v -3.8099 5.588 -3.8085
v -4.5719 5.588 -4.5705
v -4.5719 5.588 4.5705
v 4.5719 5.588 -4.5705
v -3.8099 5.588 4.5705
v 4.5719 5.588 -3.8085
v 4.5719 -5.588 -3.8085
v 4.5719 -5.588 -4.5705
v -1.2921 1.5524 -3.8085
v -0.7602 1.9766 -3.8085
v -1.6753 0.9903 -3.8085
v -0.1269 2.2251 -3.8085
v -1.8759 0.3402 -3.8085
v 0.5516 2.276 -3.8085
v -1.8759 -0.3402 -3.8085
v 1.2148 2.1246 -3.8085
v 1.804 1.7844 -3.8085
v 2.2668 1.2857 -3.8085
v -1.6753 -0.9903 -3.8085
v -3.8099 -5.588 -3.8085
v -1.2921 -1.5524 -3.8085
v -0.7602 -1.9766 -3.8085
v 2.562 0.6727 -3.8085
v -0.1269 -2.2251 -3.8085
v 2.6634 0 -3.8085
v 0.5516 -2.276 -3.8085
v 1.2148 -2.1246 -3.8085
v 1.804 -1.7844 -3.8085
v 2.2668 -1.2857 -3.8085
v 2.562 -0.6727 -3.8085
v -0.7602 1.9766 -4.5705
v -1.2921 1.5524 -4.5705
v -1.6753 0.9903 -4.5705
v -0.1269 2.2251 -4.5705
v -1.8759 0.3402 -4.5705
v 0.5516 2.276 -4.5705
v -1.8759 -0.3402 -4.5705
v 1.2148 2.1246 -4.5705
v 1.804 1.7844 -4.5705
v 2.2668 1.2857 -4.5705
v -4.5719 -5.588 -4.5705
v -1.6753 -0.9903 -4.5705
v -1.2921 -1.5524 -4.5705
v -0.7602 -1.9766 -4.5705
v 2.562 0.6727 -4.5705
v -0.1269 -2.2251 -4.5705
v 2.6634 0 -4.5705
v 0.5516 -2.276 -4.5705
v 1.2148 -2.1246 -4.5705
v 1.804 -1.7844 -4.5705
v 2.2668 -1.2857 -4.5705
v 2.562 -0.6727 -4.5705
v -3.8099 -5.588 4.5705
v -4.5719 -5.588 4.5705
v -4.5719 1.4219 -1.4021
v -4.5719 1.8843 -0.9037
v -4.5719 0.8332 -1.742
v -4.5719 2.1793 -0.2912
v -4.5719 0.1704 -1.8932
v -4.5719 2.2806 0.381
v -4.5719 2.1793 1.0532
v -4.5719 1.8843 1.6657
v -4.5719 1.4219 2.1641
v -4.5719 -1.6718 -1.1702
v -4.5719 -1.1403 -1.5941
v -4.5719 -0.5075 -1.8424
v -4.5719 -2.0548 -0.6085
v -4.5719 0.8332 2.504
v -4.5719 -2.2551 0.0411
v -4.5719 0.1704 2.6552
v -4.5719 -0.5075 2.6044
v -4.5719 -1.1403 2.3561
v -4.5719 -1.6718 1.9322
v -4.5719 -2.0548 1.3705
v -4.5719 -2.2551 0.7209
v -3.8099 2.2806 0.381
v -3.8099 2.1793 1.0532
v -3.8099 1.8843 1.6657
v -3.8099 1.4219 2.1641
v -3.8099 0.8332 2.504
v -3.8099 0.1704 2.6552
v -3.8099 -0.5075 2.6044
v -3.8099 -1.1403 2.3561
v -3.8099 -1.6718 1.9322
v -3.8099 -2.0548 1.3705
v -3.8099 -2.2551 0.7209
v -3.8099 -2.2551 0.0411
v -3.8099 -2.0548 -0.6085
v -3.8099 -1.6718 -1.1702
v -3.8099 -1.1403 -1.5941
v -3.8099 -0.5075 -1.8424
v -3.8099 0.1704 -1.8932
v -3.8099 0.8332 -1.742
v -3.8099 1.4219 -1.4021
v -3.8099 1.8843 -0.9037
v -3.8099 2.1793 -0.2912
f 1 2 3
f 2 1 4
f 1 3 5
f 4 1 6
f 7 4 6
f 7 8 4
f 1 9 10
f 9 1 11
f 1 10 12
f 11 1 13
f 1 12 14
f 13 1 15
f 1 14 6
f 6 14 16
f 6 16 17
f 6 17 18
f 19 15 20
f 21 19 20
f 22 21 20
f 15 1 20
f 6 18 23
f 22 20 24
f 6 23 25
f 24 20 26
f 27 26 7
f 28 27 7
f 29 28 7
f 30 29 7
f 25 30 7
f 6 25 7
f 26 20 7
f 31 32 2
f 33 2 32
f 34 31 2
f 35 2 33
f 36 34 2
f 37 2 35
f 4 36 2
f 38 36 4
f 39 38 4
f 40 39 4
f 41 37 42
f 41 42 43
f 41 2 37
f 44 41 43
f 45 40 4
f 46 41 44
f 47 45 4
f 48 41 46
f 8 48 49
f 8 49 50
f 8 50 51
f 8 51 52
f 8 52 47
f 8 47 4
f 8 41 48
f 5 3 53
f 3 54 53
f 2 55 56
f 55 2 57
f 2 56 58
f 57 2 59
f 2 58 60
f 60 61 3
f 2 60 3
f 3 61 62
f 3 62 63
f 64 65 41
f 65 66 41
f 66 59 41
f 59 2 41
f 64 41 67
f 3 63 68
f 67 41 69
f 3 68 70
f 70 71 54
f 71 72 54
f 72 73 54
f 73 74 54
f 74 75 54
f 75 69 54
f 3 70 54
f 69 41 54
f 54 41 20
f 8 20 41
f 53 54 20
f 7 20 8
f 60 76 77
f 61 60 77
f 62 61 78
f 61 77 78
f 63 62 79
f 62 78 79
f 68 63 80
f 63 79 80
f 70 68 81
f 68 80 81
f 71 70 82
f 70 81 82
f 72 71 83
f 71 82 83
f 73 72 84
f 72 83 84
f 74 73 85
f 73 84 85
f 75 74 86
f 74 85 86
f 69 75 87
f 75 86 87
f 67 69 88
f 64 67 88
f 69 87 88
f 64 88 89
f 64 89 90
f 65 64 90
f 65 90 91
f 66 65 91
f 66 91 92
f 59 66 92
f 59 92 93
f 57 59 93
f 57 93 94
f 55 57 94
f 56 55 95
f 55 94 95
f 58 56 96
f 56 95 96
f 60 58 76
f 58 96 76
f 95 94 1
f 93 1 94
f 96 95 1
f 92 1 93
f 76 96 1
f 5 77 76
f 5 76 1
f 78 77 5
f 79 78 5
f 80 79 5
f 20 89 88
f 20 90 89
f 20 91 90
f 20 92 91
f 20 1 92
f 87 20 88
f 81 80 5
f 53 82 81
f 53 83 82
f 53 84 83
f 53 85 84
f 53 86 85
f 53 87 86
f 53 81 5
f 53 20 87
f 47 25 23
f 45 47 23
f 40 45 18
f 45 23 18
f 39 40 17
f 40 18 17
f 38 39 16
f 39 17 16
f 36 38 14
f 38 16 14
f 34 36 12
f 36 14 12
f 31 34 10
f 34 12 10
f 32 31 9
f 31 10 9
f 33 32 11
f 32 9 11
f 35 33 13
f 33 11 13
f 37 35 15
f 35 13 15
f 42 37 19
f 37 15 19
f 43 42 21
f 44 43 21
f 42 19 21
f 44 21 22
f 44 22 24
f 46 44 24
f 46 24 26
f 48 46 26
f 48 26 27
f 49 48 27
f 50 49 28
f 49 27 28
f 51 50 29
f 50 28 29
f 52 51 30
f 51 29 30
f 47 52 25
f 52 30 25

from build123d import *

# Parameters (mm, degrees)
F0_W          = 9.14383
F0_H          = 9.140982
F1_DEPTH      = 5.588
F1_DEPTH_BACK = 5.588
F2_T          = -0.762
F3_R          = 2.280613
F4_DEPTH      = 0.762
F5_R          = 2.282355
F6_DEPTH      = 0.762


with BuildPart() as f1:
    # F0 (on Front) → F1 (new body, two sides)
    with BuildSketch(Plane.XZ) as f1_sk:
        Rectangle(F0_W, F0_H)
    extrude(amount=F1_DEPTH)
    extrude(f1_sk.sketch, amount=-F1_DEPTH_BACK)

    # F2
    f2_openings = [f1.faces().sort_by_distance(p)[0] for p in [
        (0, 0, 4.570491),
        (4.571915, 0, 0),
        (0, -5.588, 0),
        (0, 5.588, 0),
    ]]
    offset(amount=F2_T, openings=f2_openings)

    # F3 (on face) → F4 (cut)
    with BuildSketch(Plane.YZ.offset(-3.809915)):
        with Locations((0, 0.381)):
            Circle(F3_R)
    extrude(amount=-F4_DEPTH, mode=Mode.SUBTRACT)

    # F5 (on face) → F6 (cut)
    with BuildSketch(Plane.XY.offset(-3.808491)):
        with Locations((0.381, 0)):
            Circle(F5_R)
    extrude(amount=-F6_DEPTH, mode=Mode.SUBTRACT)


solid = f1.part
